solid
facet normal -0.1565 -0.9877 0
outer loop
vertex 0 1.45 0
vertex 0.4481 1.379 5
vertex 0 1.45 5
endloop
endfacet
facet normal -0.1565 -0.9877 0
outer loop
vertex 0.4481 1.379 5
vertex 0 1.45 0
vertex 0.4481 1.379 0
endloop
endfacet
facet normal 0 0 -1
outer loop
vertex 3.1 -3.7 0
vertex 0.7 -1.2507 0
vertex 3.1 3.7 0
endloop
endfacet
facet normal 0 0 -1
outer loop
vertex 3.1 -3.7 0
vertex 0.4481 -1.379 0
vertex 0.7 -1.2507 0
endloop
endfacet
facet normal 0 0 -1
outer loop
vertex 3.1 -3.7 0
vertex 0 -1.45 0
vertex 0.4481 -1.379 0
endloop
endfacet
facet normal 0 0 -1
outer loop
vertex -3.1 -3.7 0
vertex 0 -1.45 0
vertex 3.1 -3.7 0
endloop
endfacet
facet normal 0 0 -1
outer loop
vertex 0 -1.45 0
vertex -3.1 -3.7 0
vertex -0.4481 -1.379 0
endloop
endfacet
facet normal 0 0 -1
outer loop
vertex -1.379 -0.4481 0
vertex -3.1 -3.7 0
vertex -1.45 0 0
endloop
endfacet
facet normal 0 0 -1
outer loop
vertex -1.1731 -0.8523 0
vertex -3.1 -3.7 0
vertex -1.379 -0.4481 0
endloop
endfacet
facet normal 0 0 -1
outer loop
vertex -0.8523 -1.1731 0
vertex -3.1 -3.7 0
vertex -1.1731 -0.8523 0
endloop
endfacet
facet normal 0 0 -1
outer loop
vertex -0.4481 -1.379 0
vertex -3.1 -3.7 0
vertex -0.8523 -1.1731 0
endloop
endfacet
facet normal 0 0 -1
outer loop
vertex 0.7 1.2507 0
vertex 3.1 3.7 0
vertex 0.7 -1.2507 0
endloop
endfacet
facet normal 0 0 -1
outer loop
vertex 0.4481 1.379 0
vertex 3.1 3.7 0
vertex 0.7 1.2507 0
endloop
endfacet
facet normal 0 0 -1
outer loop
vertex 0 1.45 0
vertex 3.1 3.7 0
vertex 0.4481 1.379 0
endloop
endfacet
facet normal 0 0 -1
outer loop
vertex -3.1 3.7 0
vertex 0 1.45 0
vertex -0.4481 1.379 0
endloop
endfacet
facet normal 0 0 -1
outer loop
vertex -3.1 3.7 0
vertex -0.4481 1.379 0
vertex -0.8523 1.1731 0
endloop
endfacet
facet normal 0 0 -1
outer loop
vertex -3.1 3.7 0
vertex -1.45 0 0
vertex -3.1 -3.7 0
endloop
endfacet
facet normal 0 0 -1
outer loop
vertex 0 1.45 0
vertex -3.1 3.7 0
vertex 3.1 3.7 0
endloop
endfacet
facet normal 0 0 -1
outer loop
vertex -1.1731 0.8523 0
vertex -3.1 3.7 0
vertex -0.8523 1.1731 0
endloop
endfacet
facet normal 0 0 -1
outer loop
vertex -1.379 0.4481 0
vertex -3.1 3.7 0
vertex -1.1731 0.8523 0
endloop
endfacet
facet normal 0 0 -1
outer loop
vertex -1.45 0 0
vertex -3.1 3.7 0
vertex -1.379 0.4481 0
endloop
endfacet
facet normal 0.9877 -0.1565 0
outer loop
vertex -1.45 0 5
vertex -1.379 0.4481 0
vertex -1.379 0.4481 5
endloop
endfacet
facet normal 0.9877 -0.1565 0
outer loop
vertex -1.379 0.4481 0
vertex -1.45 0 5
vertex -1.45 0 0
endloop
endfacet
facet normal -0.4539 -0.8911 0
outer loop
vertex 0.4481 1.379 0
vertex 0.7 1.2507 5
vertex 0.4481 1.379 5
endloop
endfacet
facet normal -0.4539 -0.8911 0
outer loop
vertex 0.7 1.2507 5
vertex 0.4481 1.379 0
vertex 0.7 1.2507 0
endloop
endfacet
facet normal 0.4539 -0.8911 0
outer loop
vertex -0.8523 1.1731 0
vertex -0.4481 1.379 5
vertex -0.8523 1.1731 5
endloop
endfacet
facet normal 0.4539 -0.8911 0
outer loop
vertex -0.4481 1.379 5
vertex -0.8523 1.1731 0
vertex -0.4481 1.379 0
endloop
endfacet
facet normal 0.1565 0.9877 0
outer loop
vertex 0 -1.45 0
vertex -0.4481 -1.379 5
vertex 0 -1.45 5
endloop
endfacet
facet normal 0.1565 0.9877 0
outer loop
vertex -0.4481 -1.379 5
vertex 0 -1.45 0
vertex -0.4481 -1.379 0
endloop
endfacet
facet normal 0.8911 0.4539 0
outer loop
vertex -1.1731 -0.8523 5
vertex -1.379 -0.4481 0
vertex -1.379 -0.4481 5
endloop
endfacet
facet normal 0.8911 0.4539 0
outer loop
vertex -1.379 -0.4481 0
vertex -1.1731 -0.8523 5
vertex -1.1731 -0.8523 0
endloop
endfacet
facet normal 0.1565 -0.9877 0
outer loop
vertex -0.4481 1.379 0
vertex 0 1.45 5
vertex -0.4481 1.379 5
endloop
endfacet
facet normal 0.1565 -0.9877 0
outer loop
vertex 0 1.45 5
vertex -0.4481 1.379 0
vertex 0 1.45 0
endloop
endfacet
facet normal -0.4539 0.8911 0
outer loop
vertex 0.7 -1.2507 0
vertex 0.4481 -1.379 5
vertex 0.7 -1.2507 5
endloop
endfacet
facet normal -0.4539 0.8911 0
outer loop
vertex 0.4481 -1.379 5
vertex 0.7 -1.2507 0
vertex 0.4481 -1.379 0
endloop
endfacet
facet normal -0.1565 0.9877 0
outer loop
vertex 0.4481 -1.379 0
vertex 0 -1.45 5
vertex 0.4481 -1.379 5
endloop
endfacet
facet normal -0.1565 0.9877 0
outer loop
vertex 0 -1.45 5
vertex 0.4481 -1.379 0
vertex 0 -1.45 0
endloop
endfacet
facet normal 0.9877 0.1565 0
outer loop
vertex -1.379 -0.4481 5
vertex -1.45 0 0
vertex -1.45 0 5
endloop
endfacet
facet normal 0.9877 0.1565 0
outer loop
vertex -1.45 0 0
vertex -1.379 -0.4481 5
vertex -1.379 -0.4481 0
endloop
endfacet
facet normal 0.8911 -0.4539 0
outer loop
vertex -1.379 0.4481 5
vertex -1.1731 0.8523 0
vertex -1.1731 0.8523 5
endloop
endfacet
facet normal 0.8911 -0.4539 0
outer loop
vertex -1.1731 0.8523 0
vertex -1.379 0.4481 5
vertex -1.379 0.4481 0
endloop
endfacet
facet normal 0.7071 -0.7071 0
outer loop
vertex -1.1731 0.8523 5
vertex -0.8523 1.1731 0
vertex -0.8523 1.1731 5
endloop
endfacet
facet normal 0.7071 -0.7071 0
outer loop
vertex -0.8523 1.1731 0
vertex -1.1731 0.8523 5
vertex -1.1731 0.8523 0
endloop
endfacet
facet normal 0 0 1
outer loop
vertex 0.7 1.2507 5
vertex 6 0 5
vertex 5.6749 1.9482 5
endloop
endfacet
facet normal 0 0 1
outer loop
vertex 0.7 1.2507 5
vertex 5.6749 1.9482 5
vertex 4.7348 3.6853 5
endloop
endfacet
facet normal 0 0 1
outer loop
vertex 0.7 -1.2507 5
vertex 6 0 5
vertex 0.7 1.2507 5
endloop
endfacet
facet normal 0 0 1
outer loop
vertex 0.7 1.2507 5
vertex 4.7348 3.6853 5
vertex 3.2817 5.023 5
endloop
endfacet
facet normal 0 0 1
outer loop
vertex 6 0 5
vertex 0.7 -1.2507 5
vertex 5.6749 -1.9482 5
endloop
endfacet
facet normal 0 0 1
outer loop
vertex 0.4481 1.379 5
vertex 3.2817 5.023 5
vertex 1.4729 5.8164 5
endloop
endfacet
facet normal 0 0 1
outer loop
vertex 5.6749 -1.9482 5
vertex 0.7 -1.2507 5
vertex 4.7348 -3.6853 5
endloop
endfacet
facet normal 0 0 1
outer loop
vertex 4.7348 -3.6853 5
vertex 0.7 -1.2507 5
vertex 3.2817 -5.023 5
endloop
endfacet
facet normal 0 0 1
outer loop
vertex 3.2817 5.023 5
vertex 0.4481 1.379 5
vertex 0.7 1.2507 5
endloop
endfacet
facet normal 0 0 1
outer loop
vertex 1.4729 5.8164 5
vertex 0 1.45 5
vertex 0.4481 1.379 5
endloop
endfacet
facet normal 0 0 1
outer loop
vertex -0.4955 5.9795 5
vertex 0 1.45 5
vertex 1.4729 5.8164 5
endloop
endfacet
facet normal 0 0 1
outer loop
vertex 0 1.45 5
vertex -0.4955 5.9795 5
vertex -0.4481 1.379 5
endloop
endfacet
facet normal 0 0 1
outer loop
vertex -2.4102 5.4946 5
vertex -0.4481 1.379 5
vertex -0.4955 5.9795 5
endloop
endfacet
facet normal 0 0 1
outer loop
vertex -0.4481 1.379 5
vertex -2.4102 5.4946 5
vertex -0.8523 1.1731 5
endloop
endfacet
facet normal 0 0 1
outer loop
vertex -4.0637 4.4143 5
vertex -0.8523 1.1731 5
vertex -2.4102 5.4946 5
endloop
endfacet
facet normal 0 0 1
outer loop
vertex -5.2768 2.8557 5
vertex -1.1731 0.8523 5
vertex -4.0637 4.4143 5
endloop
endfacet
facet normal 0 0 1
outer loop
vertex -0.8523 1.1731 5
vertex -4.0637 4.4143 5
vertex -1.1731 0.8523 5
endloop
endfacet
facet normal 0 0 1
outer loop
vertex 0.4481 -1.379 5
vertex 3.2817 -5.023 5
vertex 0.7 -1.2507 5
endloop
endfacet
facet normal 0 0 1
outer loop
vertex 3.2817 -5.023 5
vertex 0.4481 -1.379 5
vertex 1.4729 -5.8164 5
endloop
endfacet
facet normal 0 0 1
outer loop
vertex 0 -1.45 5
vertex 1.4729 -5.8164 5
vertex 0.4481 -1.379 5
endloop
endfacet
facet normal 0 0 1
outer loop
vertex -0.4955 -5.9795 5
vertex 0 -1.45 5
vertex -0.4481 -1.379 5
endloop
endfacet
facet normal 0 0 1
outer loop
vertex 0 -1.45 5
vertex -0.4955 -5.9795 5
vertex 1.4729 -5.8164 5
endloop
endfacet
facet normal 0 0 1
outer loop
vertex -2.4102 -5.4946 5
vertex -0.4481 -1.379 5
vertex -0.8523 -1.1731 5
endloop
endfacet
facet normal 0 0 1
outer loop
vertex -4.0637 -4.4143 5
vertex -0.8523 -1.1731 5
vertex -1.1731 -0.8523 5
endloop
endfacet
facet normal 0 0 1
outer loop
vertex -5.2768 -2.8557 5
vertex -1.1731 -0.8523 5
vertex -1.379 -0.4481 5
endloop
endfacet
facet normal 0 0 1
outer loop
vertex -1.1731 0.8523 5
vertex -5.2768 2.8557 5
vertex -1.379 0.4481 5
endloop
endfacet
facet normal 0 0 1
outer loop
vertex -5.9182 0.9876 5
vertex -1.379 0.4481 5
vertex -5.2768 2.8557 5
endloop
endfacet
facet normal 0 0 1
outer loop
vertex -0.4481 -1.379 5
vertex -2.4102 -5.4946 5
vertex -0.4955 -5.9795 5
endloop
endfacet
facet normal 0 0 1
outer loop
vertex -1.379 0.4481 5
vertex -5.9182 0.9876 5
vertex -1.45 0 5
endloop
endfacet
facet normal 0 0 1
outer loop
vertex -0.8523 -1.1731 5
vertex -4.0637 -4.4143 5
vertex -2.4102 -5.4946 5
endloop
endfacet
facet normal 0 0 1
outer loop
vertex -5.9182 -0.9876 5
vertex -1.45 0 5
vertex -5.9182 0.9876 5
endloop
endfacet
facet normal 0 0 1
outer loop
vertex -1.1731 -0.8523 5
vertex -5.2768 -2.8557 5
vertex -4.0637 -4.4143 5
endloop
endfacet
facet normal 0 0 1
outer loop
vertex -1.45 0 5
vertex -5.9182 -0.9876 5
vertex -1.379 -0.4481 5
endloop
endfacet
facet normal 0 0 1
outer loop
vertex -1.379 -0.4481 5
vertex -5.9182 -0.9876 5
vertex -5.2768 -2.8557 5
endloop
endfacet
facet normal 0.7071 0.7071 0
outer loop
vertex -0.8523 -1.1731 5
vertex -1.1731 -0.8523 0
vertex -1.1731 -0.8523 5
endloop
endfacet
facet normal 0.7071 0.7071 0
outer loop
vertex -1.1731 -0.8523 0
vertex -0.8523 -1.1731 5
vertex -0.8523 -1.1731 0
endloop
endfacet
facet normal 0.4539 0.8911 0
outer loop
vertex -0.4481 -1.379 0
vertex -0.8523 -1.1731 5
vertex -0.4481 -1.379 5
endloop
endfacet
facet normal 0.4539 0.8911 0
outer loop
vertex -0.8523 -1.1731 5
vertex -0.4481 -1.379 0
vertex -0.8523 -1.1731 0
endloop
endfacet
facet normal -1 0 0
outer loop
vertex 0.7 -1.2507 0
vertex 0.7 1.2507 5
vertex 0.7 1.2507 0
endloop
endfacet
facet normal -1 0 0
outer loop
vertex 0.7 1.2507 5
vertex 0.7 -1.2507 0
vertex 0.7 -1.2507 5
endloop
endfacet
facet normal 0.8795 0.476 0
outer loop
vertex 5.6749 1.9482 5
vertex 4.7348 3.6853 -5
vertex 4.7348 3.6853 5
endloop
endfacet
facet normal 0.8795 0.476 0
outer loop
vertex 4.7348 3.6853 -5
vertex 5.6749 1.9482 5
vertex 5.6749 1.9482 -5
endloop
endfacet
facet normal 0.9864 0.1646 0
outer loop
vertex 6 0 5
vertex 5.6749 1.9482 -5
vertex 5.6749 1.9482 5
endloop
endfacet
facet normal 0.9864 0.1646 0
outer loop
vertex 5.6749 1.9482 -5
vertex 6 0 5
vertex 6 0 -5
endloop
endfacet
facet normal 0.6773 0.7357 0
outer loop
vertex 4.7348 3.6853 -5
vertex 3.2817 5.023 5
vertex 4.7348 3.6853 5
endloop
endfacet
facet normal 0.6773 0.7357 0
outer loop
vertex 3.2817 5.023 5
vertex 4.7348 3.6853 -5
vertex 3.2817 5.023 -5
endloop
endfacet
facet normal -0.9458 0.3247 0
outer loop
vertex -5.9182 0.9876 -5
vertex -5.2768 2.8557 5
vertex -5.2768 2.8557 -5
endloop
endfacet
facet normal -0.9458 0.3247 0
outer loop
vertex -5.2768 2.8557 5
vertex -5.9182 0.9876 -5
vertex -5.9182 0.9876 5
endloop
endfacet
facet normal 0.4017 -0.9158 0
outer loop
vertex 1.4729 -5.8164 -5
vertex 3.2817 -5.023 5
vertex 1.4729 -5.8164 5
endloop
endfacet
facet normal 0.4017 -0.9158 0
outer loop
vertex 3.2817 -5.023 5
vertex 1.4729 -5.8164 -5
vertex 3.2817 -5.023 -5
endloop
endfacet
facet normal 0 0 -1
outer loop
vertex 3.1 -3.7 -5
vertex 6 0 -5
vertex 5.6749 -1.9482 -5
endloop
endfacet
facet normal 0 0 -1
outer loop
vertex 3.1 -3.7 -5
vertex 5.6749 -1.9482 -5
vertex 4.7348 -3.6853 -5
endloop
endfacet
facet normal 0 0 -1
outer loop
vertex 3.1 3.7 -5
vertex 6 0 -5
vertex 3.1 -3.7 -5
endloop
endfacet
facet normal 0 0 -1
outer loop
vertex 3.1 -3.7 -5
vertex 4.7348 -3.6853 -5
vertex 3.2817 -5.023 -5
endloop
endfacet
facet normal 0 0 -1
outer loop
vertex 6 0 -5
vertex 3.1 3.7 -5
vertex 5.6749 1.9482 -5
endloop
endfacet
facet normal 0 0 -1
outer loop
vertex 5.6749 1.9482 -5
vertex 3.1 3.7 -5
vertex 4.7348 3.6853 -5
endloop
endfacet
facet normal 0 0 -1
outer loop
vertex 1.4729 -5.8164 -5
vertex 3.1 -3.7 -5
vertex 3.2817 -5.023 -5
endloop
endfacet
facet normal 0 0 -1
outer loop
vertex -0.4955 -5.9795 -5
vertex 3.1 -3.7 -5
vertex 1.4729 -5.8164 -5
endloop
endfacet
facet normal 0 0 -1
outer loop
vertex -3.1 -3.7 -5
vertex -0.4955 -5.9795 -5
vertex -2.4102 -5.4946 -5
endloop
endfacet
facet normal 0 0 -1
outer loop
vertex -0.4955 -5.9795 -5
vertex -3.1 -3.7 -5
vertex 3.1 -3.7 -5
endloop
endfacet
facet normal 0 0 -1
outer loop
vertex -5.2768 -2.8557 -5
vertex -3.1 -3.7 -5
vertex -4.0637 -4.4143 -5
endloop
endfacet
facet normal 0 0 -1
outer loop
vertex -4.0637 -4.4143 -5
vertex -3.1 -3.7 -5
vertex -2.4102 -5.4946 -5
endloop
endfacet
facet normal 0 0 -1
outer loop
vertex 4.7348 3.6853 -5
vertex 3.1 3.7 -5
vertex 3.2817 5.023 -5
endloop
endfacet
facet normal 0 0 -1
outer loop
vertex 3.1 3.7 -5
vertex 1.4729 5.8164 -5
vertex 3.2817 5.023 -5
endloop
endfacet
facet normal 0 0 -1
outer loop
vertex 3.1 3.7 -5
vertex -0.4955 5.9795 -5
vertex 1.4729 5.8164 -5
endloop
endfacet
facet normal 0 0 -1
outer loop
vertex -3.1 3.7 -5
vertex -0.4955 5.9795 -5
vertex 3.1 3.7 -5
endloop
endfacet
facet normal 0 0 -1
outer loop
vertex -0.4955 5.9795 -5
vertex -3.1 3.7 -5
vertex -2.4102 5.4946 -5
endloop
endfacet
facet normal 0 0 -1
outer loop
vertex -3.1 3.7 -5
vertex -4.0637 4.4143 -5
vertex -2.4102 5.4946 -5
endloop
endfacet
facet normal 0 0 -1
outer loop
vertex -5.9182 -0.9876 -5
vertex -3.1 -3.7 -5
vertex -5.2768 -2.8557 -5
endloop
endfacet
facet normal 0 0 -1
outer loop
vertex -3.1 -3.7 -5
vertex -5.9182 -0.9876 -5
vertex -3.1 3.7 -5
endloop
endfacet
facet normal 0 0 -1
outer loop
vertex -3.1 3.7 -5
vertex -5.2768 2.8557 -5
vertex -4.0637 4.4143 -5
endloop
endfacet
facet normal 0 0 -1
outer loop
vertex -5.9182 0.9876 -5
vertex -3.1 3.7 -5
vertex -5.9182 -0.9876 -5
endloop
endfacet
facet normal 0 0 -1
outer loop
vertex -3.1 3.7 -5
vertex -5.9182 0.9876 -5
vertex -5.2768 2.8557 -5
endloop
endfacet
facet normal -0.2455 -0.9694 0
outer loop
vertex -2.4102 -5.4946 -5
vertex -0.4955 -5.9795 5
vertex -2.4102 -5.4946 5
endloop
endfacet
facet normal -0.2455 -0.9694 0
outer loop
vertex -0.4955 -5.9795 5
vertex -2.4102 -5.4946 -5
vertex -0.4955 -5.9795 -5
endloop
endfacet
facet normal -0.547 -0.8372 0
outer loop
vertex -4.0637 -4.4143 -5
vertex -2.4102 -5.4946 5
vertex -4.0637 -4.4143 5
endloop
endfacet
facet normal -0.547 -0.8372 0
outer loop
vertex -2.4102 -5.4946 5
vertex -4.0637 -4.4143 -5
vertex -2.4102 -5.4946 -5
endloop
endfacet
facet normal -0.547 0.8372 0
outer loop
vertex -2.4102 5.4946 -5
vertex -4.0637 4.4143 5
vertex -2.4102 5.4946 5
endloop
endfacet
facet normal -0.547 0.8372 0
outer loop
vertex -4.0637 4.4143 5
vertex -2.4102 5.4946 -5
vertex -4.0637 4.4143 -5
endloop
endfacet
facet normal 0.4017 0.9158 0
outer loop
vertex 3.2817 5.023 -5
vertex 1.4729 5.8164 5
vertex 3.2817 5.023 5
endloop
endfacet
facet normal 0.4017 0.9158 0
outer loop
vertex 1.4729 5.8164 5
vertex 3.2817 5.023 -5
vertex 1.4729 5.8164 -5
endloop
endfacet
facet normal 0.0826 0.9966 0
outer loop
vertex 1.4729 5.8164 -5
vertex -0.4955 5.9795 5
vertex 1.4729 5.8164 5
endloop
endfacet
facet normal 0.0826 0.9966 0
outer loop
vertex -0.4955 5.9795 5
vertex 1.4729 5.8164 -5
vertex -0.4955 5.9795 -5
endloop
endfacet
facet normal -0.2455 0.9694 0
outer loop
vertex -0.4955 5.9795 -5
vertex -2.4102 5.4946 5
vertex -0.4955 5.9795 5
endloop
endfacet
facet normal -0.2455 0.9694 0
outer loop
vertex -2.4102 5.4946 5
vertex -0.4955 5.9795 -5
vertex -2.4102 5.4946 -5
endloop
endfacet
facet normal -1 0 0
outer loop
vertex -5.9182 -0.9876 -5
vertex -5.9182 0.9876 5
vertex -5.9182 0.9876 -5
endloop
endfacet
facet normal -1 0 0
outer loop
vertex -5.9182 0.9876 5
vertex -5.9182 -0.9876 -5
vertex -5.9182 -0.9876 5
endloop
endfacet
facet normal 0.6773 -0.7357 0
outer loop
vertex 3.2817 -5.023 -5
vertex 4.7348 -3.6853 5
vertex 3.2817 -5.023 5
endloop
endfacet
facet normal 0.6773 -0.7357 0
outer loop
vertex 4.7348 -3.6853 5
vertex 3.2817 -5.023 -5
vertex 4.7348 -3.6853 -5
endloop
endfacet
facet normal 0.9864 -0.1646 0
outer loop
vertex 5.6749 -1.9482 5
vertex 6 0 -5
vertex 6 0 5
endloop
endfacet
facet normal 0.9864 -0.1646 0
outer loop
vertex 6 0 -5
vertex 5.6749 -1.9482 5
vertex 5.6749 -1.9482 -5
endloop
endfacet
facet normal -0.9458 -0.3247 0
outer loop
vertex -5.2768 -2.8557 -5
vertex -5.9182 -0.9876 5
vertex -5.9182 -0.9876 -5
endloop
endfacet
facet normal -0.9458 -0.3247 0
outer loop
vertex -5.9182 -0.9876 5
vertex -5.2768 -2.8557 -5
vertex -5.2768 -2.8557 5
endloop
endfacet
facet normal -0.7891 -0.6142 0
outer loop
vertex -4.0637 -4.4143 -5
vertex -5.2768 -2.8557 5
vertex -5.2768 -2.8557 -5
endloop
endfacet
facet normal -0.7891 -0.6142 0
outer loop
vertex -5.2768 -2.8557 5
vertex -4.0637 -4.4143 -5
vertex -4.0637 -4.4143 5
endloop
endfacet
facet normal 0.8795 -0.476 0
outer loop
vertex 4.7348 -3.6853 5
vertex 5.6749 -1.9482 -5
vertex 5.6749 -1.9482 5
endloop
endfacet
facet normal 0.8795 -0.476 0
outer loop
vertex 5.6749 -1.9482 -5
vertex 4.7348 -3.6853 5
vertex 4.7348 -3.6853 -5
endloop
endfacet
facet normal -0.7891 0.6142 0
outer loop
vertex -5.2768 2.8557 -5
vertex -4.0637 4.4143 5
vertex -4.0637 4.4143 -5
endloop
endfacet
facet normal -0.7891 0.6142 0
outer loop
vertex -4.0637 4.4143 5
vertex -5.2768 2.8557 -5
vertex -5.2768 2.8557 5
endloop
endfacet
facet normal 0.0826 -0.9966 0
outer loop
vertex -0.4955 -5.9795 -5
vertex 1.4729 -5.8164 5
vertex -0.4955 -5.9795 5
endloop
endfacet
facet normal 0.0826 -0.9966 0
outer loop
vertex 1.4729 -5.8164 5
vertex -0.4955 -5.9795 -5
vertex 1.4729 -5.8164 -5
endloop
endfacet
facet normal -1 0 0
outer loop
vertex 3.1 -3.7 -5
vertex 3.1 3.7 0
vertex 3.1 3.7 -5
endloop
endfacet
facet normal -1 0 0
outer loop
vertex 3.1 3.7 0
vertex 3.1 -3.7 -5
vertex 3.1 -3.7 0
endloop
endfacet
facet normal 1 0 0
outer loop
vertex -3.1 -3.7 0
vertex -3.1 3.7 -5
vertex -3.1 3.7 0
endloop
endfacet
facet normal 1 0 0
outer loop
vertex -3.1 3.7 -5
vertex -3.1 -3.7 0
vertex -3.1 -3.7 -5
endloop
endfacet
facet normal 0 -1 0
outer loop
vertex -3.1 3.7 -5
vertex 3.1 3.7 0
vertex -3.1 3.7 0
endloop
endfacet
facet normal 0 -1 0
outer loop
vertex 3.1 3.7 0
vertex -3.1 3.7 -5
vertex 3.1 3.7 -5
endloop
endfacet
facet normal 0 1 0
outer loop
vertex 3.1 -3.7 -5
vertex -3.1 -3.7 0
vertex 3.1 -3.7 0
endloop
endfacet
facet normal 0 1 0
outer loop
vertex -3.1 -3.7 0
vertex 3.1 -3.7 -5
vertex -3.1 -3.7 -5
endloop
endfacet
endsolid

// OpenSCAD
// the joint between the actuator and the navigation switch (e.g., http://www.mouser.co.uk/ProductDetail/ALPS/RKJXT1F42001/)
module motor_joint_navigation_switch() {
	radius = 6;
	height = 10;

	difference() {
		cylinder(h = height, r = radius, center = true);

		// stepper motor joint hole
		translate([0, 0, -((height / 2) - (height / 4))]) {
			cube(size = [6.2, 7.4, height / 2], center = true);
		}
		
		// the navigation switch / encoder hole
		translate([0, 0, ((height / 2) - (height / 4))]) {
			difference() {
				cylinder(h = height / 2, r = 1.45, center = true, $fn = 20);
				translate([1.6, 0, 0]) { // 1.6 = 2.5 - (1.8 / 2)
					cube(size = [1.8, 5, height / 2], center = true);
				}
			}
		}
	}
}

motor_joint_navigation_switch();
